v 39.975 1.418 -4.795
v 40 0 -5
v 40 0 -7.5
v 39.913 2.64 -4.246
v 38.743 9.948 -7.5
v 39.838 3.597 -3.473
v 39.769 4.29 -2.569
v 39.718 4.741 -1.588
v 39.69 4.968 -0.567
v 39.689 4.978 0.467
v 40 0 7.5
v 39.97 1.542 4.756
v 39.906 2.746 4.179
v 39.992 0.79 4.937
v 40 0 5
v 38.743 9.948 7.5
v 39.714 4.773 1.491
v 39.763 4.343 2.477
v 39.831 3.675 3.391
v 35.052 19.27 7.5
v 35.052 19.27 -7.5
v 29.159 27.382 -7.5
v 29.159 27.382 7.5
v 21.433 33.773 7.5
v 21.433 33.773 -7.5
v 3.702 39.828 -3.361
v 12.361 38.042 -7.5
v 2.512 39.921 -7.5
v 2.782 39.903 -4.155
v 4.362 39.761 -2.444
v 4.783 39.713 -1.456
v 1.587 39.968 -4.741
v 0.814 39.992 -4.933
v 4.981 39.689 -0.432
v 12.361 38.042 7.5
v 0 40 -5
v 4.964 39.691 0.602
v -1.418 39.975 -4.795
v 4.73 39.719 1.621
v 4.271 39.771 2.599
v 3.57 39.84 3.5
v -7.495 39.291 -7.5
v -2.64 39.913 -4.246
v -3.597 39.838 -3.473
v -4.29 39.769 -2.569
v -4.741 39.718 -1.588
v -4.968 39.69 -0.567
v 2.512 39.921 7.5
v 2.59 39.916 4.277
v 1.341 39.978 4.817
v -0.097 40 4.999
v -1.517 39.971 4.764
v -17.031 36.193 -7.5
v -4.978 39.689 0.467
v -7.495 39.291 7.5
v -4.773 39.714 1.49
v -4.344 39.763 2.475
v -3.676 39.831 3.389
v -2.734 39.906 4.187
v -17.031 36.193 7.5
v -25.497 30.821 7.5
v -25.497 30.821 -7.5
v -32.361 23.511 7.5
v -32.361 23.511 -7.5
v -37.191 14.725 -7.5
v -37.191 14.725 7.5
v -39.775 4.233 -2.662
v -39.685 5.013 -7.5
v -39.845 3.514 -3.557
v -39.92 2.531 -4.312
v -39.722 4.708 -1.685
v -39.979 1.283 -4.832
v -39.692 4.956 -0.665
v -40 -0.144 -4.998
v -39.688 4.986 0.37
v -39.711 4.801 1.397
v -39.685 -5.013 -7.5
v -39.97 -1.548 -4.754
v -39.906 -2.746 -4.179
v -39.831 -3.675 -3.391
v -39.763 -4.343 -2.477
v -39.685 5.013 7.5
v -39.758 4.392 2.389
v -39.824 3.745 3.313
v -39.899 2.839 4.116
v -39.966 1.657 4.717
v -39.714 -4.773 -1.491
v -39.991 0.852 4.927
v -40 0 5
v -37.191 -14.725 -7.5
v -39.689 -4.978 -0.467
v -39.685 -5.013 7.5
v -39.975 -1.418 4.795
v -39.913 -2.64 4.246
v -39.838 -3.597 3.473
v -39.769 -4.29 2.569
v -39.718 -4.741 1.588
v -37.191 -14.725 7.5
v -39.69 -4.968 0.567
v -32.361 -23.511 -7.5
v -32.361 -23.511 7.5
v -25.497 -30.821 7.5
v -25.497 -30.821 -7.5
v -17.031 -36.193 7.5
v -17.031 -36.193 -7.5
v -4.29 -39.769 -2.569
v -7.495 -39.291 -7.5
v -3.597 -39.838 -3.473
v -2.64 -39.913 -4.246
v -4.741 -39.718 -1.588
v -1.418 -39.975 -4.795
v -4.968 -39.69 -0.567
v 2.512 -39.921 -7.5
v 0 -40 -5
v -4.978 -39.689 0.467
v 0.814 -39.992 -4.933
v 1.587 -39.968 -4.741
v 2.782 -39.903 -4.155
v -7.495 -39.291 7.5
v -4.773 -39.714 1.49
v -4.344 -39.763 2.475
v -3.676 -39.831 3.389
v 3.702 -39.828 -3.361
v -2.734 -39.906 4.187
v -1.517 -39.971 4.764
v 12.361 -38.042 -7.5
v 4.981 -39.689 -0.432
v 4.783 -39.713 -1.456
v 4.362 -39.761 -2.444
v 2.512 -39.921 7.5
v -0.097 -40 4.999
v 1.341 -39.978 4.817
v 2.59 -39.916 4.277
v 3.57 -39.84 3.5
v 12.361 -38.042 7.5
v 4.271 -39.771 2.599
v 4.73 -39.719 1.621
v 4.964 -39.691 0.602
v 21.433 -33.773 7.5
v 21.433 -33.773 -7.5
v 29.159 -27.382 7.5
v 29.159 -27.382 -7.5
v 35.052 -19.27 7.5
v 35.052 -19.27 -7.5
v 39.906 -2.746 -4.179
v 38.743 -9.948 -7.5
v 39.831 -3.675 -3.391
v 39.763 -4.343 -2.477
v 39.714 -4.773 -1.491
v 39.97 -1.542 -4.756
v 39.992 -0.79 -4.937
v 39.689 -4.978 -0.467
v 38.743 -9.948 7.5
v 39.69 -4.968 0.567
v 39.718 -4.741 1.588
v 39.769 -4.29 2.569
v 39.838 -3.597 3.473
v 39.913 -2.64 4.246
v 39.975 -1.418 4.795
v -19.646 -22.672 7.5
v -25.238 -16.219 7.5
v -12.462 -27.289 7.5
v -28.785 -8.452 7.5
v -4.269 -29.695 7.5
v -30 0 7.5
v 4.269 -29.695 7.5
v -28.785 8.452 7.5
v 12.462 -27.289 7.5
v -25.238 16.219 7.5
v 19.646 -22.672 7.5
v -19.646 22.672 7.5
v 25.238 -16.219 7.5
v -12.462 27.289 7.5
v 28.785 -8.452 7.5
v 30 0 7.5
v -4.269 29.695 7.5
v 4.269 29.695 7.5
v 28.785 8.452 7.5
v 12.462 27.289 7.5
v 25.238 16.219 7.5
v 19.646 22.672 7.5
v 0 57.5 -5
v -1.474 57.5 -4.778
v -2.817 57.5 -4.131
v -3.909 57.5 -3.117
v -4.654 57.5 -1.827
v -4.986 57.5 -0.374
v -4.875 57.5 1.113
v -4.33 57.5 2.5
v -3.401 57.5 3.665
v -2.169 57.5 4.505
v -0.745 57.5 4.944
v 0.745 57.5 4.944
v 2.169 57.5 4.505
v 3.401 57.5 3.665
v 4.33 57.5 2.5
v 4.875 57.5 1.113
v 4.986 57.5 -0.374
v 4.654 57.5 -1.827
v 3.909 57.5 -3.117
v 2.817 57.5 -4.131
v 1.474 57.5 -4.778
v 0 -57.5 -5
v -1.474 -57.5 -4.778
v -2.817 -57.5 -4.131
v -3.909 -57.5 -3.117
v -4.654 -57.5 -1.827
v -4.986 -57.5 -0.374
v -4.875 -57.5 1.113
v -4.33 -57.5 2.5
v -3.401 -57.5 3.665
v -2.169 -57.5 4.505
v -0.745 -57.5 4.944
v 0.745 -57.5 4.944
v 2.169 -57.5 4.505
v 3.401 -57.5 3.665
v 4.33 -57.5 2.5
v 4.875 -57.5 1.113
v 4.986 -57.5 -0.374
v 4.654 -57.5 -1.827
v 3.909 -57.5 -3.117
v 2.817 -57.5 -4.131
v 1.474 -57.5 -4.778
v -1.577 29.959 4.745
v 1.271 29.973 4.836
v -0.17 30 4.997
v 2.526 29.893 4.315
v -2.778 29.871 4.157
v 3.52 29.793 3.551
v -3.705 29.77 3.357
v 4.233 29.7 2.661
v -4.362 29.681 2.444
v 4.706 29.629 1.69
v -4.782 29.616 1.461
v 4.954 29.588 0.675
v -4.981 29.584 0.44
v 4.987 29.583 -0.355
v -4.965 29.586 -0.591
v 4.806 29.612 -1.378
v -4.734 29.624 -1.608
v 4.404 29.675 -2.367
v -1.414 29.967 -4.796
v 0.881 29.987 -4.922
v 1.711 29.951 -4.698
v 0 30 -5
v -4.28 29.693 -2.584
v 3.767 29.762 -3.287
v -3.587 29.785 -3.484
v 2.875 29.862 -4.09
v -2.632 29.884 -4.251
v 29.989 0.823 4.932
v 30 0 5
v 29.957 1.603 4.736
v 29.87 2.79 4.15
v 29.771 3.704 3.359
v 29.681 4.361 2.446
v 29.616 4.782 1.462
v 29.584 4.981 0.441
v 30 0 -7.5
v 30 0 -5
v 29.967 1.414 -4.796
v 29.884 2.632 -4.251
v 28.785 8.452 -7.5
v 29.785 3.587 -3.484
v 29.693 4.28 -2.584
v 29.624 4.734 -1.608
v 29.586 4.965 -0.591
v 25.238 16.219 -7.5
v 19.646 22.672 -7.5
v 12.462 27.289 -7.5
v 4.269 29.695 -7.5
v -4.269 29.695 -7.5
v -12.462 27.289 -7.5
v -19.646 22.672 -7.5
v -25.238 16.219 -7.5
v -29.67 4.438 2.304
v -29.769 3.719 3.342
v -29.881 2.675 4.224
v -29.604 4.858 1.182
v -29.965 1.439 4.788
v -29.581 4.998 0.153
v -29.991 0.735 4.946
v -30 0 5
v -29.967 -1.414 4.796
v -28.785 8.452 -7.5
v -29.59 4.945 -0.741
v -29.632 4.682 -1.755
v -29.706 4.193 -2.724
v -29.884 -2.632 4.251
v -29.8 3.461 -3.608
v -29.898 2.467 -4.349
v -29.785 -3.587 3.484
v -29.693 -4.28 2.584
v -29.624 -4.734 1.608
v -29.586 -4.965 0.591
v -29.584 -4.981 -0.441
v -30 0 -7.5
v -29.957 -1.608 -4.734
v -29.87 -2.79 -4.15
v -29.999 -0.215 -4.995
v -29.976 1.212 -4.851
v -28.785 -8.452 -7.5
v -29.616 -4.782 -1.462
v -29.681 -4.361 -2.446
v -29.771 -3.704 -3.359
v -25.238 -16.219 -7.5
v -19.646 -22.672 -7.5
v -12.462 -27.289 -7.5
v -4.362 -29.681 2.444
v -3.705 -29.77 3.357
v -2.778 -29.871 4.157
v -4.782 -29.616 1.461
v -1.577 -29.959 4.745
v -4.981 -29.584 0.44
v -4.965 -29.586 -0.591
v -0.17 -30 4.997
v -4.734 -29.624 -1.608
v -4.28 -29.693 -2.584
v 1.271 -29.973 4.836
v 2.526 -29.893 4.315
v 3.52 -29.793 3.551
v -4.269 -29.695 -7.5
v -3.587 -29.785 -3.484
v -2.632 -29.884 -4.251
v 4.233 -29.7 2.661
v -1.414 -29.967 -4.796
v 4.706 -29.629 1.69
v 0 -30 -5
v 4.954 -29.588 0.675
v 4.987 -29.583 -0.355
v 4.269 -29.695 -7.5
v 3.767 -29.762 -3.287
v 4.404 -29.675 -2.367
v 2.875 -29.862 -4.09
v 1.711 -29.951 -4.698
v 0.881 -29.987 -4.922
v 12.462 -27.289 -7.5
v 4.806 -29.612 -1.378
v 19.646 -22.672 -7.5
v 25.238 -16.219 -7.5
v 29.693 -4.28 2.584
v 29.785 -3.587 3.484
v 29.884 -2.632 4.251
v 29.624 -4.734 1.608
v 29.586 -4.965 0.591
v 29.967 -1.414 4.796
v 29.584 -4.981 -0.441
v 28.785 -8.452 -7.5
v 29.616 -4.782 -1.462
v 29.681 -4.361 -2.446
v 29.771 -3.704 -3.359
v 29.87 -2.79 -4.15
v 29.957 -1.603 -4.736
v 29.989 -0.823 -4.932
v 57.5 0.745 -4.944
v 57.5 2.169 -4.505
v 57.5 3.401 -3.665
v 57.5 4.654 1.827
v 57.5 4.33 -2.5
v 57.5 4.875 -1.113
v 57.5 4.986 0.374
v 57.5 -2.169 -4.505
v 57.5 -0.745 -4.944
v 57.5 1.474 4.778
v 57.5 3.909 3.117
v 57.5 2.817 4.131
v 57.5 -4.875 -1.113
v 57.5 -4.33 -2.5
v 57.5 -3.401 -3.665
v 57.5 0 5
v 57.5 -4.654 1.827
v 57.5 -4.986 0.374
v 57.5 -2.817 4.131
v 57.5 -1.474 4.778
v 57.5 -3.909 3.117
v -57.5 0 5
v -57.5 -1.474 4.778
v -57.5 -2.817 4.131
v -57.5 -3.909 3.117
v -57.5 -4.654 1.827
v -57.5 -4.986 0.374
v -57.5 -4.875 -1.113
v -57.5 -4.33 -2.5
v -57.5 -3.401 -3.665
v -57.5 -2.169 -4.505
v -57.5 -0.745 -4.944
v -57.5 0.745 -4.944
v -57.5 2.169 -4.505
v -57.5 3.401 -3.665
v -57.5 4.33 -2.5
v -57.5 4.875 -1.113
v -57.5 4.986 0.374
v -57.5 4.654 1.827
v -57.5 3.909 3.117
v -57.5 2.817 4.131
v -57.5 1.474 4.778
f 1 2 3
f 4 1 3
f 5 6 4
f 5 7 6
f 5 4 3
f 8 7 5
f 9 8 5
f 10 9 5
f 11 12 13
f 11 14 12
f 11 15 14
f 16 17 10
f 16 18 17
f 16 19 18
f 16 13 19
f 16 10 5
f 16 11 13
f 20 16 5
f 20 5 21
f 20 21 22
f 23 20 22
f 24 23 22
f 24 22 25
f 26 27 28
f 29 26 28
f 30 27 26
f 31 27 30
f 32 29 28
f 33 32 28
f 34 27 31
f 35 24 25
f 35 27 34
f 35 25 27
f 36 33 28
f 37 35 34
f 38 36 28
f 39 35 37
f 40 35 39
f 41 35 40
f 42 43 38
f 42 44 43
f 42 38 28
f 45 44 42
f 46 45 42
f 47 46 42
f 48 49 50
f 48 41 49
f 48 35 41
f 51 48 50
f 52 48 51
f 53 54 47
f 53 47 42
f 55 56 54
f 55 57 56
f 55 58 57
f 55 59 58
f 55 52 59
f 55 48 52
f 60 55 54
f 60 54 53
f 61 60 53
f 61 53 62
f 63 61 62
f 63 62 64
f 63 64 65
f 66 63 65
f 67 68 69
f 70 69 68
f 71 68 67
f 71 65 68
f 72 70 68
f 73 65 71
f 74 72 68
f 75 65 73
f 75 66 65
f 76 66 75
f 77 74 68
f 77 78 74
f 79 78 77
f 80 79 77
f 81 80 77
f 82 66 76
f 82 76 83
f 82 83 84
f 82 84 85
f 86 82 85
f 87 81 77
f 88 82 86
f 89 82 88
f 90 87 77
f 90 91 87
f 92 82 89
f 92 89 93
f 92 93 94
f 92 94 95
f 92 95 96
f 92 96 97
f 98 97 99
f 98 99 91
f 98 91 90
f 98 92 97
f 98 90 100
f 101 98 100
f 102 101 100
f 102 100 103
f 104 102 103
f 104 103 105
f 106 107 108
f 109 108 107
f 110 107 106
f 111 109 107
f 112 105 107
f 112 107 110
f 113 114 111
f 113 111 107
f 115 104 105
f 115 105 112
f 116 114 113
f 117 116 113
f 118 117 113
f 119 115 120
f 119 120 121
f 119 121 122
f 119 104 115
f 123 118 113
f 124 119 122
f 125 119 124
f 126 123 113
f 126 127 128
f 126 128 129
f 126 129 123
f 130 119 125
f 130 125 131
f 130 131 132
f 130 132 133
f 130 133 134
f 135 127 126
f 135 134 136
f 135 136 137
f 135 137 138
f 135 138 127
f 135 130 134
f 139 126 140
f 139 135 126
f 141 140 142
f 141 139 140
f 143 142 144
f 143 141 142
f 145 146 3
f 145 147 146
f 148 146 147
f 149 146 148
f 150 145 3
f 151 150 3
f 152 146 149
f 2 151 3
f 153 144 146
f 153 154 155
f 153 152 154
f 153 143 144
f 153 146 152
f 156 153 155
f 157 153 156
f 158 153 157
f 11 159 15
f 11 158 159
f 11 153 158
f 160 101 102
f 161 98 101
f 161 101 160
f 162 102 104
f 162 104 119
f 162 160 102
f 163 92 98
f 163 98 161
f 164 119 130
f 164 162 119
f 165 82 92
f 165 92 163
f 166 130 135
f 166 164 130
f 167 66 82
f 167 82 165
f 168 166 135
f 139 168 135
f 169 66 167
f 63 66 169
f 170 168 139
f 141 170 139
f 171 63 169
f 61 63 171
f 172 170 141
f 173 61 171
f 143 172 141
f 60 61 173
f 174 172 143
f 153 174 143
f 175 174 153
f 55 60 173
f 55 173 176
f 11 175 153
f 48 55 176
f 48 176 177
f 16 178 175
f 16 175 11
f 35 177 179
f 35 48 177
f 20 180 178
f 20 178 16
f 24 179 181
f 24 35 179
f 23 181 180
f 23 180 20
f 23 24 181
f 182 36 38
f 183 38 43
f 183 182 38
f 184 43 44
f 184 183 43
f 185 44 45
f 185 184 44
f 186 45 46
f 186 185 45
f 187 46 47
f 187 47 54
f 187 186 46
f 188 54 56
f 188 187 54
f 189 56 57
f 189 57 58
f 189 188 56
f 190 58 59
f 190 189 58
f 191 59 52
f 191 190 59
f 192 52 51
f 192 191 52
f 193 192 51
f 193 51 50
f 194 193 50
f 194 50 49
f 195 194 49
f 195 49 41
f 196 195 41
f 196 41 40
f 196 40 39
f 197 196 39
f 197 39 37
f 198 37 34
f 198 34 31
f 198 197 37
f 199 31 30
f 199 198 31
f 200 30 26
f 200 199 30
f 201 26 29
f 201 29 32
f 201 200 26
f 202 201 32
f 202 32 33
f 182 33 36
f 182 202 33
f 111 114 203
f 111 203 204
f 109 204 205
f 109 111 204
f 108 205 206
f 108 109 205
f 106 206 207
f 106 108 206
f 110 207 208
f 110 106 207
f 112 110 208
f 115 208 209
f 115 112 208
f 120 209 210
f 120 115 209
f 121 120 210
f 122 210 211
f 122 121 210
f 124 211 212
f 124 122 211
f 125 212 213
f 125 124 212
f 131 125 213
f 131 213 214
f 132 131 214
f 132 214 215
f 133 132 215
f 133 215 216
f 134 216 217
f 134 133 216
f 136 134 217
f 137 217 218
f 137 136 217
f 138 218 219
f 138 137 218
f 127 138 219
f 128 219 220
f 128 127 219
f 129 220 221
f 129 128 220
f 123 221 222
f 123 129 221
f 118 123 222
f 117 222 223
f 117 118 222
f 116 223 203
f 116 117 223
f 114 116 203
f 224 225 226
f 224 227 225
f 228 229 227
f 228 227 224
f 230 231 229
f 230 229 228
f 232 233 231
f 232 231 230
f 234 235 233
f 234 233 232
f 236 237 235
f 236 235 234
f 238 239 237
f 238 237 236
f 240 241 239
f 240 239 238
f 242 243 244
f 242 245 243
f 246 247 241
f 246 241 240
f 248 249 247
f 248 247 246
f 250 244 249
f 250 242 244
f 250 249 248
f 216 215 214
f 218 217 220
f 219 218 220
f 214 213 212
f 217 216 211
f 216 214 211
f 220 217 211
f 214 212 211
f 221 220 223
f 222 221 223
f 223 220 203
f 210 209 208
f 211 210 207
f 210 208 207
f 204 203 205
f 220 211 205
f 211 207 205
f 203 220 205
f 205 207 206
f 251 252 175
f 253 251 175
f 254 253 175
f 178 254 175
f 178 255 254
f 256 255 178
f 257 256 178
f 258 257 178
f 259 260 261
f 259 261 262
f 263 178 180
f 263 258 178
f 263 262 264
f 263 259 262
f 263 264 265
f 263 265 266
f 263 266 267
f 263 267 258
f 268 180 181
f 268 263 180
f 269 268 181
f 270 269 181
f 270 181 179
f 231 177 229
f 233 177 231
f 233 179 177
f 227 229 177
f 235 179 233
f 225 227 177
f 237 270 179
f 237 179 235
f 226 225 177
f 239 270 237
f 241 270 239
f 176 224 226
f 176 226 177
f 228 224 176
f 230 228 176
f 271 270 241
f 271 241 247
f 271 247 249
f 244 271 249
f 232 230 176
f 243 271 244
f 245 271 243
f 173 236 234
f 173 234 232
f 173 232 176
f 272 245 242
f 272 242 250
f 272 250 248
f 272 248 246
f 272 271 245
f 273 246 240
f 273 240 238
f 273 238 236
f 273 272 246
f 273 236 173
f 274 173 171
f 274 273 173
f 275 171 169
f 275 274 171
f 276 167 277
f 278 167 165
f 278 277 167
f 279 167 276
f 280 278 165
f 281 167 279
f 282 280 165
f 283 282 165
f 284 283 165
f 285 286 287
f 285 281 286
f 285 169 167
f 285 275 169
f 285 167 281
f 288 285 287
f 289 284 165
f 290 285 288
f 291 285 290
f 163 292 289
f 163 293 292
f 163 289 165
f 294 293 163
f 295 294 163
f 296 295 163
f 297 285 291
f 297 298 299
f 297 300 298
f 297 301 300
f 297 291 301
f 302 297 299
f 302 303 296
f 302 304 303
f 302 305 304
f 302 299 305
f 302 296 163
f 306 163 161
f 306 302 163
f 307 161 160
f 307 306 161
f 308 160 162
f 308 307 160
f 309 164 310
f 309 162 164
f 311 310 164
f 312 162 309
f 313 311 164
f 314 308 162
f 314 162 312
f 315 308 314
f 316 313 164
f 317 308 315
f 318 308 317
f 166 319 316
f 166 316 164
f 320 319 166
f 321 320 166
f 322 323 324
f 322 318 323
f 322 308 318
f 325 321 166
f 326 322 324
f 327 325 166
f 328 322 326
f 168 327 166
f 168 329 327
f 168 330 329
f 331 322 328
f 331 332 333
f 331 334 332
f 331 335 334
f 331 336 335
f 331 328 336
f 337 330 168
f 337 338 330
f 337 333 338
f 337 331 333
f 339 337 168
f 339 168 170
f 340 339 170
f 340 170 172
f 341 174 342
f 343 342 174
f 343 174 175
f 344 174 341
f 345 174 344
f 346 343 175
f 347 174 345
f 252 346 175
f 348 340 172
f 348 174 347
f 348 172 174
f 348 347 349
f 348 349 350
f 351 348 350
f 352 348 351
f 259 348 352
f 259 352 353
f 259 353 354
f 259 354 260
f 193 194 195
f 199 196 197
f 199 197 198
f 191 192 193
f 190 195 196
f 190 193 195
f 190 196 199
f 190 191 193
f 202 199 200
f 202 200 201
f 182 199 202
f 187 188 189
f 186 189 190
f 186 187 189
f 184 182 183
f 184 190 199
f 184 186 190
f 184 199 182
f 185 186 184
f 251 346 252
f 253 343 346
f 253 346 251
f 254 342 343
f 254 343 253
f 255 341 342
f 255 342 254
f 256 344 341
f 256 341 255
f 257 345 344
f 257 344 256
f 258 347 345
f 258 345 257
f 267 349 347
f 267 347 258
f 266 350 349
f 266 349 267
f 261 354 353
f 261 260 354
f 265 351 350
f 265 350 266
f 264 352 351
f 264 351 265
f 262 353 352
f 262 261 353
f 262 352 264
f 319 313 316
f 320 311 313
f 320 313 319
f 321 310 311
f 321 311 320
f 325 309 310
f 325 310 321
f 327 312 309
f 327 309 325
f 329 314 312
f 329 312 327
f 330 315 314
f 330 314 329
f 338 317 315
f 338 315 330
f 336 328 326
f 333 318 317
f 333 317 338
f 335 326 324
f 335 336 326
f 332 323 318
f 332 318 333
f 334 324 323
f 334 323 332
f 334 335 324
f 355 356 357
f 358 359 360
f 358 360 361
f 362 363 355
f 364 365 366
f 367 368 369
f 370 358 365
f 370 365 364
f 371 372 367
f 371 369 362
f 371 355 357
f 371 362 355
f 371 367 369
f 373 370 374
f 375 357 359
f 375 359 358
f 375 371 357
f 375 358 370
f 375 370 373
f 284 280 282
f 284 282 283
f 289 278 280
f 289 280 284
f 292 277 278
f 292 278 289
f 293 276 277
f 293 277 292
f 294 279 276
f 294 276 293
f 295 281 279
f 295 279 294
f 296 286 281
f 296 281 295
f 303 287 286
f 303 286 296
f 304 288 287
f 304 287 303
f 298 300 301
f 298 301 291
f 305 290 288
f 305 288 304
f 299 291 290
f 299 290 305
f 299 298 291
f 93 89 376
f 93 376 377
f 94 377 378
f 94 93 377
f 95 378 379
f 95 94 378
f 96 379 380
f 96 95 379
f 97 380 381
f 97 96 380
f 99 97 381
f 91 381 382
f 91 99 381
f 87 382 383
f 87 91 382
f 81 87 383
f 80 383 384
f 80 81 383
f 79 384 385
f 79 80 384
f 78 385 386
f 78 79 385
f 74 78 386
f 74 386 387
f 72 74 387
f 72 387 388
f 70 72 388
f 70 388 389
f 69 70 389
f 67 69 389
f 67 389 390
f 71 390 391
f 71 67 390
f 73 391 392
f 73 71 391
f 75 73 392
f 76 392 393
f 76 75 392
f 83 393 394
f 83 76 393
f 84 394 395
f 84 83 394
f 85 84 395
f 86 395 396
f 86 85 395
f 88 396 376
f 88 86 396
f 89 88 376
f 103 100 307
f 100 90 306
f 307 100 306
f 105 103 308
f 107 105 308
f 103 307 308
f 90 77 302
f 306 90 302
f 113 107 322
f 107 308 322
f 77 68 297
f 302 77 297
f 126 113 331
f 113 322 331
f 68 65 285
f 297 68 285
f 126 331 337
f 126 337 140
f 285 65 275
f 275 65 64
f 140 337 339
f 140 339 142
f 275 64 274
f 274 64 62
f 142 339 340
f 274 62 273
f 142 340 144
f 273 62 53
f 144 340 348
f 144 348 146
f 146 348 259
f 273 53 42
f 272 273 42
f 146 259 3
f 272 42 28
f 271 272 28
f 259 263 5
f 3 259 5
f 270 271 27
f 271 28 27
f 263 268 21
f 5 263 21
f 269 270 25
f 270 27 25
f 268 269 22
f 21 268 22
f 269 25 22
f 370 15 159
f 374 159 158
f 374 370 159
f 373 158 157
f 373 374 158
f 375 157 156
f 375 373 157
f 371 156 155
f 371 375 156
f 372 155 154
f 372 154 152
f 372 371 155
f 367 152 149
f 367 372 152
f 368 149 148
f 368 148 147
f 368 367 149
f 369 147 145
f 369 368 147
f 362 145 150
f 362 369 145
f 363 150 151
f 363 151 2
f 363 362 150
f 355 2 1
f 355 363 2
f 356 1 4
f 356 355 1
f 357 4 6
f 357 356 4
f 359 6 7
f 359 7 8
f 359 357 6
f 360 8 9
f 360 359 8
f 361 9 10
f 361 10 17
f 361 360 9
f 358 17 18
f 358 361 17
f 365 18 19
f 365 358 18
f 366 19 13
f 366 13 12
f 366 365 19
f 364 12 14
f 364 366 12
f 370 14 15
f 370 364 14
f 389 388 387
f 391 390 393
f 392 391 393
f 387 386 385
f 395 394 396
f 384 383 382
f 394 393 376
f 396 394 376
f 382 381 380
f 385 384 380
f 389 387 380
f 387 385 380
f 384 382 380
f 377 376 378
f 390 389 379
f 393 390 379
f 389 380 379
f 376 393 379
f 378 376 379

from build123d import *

# Parameters (mm, degrees)
CROQUIS2_R              = 40
CROQUIS2_R_2            = 30
SALIENTE_EXTRUIR1_DEPTH = 7.5
CROQUIS3_R              = 5
SALIENTE_EXTRUIR2_DEPTH = 57.5
CROQUIS4_R              = 5
SALIENTE_EXTRUIR3_DEPTH = 57.5
CORTAR_EXTRUIR1_START   = -115
CROQUIS5_R              = 30
CORTAR_EXTRUIR1_DEPTH   = 115


with BuildPart() as part:
    # Croquis2 → Saliente-Extruir1 (new, symmetric)
    with BuildSketch(Plane.XY):
        Circle(CROQUIS2_R)
        Circle(CROQUIS2_R_2, mode=Mode.SUBTRACT)
    extrude(amount=SALIENTE_EXTRUIR1_DEPTH, both=True)

    # Croquis3 → Saliente-Extruir2 (add, symmetric)
    with BuildSketch(Plane(origin=(0, 0, 0), x_dir=(1, 0, 0), z_dir=(0, 1, 0))):
        with Locations(Location((0, 0, 0), (0, 0, 90))):
            Circle(CROQUIS3_R)
    extrude(amount=SALIENTE_EXTRUIR2_DEPTH, both=True)

    # Croquis4 → Saliente-Extruir3 (add, symmetric)
    with BuildSketch(Plane(origin=(0, 0, 0), x_dir=(0, 0, -1), z_dir=(1, 0, 0))):
        with Locations(Location((0, 0, 0), (0, 0, 180))):
            Circle(CROQUIS4_R)
    extrude(amount=SALIENTE_EXTRUIR3_DEPTH, both=True)

    # Croquis5 → Cortar-Extruir1 (cut)
    with BuildSketch(Plane.XY.offset(7.5).offset(CORTAR_EXTRUIR1_START)):
        Circle(CROQUIS5_R)
    extrude(amount=CORTAR_EXTRUIR1_DEPTH, mode=Mode.SUBTRACT)


solid = part.part
